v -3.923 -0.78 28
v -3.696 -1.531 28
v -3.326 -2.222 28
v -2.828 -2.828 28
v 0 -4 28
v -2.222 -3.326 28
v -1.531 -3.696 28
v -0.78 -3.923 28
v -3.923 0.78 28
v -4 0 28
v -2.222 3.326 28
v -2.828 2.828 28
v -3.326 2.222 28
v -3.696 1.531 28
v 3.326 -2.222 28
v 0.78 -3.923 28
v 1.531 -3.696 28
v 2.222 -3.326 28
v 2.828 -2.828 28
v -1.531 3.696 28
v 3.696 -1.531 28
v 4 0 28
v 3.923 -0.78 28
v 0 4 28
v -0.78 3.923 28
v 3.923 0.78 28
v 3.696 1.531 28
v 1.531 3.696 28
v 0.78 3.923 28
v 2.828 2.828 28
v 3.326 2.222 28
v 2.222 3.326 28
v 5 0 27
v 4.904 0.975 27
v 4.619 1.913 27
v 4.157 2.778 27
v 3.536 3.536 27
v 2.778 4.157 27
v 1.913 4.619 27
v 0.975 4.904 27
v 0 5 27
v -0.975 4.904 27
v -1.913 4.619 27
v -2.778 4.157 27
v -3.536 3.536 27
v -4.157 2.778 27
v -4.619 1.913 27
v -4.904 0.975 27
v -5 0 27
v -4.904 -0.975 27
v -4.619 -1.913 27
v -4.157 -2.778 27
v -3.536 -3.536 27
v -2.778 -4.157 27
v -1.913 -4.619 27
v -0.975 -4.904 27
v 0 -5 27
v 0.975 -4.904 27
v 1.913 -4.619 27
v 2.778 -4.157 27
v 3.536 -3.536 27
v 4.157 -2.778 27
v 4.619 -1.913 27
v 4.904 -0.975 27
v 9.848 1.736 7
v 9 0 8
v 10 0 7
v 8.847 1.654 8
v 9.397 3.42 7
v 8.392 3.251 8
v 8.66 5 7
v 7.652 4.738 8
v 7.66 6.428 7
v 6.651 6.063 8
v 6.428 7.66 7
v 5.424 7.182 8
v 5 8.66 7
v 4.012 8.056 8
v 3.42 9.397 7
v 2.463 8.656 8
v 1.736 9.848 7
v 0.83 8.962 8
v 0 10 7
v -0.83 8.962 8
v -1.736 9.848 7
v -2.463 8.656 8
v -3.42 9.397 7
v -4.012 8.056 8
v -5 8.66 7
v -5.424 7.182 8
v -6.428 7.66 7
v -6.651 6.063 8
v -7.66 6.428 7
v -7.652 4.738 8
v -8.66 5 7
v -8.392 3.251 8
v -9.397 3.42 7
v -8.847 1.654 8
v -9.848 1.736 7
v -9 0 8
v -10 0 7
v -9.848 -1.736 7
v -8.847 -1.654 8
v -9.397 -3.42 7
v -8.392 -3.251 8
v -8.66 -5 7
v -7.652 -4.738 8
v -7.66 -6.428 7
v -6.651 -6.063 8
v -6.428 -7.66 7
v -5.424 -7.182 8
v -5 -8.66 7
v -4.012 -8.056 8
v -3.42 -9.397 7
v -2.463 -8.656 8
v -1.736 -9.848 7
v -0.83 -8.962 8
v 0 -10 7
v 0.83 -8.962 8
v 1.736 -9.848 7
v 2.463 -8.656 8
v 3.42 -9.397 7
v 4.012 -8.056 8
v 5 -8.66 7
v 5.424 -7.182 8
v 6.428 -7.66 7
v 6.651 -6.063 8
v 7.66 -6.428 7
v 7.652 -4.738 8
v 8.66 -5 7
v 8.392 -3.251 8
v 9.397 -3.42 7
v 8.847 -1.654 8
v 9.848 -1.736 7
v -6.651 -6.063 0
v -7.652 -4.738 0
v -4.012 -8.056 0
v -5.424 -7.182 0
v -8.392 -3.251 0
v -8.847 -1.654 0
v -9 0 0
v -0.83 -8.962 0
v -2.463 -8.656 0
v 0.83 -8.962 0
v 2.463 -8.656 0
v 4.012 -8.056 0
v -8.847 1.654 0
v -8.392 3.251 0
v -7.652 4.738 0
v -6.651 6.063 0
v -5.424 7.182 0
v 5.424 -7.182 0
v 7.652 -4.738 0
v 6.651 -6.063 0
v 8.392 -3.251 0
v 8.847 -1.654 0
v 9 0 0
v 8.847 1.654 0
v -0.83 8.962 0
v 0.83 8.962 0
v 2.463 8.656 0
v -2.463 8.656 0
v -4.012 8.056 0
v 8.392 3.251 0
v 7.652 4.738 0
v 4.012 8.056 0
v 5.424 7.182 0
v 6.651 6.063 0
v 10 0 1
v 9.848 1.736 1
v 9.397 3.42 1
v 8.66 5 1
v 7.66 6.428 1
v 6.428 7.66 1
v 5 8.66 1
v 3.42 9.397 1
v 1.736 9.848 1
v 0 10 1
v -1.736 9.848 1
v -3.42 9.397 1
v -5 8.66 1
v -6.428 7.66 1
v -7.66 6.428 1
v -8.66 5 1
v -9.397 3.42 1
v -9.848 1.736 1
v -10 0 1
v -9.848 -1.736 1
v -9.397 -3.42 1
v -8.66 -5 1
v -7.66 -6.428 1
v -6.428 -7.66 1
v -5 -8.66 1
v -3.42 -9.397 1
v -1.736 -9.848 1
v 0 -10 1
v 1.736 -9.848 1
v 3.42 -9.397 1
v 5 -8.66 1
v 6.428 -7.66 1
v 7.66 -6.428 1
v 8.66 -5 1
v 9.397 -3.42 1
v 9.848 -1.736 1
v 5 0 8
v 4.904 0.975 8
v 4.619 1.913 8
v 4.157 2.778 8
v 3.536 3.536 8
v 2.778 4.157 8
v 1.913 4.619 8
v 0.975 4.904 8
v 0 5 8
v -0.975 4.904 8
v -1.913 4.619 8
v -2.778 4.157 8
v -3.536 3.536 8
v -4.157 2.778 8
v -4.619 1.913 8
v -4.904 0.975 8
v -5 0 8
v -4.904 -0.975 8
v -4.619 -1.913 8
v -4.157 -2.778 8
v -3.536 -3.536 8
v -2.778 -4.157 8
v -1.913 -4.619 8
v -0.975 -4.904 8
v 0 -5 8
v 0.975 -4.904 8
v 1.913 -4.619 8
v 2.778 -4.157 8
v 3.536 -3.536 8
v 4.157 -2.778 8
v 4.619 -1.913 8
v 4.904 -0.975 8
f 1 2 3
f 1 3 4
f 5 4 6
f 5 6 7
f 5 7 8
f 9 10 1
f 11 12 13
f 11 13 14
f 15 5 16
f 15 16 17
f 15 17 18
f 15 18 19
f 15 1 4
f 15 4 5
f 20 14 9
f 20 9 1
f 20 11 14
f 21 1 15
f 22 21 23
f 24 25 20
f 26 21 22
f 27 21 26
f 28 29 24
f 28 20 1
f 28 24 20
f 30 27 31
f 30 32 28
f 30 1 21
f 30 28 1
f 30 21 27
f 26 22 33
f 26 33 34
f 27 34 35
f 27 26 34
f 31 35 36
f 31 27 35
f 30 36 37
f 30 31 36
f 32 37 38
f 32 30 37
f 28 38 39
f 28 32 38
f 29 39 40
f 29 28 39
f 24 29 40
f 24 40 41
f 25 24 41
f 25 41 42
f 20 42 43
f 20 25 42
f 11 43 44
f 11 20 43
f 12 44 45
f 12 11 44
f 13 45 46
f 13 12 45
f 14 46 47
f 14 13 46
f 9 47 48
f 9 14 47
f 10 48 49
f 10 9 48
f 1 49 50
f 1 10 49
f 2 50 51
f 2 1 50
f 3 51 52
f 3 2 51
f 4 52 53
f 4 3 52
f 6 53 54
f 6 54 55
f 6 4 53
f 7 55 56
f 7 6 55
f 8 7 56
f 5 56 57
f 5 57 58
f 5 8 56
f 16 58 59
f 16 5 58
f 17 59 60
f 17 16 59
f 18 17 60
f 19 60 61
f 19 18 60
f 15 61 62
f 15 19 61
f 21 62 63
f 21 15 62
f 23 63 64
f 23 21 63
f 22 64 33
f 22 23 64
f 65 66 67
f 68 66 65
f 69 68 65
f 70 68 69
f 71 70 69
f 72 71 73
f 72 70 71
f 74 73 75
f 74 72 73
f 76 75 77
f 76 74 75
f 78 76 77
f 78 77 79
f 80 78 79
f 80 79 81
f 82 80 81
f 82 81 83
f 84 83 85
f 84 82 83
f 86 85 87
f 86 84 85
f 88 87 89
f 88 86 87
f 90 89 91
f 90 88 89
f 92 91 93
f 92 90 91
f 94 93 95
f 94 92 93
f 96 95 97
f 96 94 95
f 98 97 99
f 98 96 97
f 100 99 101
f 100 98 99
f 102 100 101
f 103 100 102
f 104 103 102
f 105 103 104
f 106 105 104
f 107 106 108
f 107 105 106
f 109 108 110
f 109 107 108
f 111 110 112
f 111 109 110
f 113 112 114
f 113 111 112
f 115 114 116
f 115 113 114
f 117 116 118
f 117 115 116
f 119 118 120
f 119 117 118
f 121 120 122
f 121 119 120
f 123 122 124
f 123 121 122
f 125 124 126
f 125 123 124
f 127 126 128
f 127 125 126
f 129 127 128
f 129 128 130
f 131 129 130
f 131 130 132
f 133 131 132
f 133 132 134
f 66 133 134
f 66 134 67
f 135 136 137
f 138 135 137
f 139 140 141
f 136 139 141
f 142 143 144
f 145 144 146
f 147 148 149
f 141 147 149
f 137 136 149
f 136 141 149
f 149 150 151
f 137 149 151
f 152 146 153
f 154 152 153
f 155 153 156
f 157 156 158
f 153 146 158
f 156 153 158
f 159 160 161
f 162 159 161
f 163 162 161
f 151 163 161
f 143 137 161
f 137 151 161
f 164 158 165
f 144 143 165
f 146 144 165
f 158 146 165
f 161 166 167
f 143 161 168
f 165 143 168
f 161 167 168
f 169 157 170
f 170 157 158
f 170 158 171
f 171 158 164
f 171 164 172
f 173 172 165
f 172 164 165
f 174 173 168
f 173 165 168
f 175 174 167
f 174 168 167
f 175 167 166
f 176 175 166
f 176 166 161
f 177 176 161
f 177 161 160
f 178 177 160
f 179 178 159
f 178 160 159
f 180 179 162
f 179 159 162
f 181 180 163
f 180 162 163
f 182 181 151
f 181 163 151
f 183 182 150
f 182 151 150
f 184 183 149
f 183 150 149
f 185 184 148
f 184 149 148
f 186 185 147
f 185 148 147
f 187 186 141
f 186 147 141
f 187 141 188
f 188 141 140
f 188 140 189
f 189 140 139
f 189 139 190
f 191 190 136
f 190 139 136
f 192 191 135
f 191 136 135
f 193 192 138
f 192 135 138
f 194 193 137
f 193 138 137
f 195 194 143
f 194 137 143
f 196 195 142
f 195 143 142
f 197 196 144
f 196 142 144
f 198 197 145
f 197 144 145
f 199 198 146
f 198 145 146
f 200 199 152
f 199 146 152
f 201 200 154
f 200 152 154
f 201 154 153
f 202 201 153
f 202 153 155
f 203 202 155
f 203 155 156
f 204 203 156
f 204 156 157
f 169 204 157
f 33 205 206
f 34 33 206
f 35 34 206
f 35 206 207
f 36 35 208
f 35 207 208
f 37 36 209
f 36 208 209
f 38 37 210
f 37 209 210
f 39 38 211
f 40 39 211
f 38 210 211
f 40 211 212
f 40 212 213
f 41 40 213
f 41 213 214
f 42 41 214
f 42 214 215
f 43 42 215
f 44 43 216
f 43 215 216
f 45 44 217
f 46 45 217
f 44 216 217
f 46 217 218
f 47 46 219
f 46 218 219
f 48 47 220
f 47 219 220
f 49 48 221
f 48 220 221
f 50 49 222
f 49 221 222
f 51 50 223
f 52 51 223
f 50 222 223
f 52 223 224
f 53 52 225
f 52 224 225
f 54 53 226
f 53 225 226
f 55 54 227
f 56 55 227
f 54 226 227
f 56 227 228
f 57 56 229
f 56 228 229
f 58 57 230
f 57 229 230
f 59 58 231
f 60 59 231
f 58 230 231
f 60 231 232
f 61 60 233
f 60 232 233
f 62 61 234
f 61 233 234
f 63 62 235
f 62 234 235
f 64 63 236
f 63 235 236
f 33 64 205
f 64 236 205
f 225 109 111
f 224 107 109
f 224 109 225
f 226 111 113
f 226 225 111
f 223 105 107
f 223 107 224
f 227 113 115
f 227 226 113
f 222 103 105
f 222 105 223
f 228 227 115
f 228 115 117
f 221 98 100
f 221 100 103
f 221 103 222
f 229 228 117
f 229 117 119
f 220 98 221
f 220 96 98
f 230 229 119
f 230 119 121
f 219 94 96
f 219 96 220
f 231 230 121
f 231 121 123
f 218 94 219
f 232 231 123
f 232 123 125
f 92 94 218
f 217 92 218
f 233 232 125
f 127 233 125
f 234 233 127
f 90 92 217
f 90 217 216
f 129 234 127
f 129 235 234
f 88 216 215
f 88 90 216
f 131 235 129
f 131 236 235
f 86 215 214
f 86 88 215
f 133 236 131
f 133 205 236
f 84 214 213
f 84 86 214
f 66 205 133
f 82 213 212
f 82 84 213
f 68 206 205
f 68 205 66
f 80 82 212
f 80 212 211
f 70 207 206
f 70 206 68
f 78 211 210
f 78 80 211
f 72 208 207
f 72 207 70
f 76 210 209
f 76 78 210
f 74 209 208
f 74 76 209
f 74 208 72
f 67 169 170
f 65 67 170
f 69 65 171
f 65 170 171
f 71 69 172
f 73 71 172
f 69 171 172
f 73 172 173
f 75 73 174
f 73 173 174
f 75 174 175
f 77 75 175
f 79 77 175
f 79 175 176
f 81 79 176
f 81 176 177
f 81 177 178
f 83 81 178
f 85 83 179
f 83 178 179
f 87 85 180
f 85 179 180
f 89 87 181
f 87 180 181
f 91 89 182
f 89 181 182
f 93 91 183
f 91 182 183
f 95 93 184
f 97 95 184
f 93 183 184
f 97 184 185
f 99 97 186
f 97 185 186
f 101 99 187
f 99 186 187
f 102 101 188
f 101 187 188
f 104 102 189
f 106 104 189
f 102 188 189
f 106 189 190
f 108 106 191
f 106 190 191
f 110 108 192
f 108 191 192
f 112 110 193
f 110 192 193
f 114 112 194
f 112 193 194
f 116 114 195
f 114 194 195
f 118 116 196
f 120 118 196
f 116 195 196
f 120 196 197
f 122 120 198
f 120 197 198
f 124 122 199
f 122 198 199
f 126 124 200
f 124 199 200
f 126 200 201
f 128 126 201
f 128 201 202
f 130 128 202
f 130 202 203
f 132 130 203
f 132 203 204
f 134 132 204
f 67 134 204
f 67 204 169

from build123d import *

# Parameters (mm, degrees)
CROQUIS1_R              = 10
SALIENTE_EXTRUIR1_DEPTH = 8
CROQUIS2_R              = 5
SALIENTE_EXTRUIR2_DEPTH = 20
CHAFL_N1_SIZE           = 1
CHAFL_N2_SIZE           = 1


with BuildPart() as part:
    # Croquis1 → Saliente-Extruir1 (new body)
    with BuildSketch(Plane.XY):
        Circle(CROQUIS1_R)
    extrude(amount=SALIENTE_EXTRUIR1_DEPTH)

    # Croquis2 → Saliente-Extruir2 (add)
    with BuildSketch(Plane.XY.offset(8)):
        Circle(CROQUIS2_R)
    extrude(amount=SALIENTE_EXTRUIR2_DEPTH)

    # Chaflán1
    chafl_n1_edges = [part.edges().sort_by_distance(p)[0] for p in [
        (-10, 0, 0),
        (-10, 0, 8),
    ]]
    chamfer(chafl_n1_edges, length=CHAFL_N1_SIZE)

    # Chaflán2
    chafl_n2_edges = [part.edges().sort_by_distance(p)[0] for p in [
        (-5, 0, 28),
    ]]
    chamfer(chafl_n2_edges, length=CHAFL_N2_SIZE)


solid = part.part
